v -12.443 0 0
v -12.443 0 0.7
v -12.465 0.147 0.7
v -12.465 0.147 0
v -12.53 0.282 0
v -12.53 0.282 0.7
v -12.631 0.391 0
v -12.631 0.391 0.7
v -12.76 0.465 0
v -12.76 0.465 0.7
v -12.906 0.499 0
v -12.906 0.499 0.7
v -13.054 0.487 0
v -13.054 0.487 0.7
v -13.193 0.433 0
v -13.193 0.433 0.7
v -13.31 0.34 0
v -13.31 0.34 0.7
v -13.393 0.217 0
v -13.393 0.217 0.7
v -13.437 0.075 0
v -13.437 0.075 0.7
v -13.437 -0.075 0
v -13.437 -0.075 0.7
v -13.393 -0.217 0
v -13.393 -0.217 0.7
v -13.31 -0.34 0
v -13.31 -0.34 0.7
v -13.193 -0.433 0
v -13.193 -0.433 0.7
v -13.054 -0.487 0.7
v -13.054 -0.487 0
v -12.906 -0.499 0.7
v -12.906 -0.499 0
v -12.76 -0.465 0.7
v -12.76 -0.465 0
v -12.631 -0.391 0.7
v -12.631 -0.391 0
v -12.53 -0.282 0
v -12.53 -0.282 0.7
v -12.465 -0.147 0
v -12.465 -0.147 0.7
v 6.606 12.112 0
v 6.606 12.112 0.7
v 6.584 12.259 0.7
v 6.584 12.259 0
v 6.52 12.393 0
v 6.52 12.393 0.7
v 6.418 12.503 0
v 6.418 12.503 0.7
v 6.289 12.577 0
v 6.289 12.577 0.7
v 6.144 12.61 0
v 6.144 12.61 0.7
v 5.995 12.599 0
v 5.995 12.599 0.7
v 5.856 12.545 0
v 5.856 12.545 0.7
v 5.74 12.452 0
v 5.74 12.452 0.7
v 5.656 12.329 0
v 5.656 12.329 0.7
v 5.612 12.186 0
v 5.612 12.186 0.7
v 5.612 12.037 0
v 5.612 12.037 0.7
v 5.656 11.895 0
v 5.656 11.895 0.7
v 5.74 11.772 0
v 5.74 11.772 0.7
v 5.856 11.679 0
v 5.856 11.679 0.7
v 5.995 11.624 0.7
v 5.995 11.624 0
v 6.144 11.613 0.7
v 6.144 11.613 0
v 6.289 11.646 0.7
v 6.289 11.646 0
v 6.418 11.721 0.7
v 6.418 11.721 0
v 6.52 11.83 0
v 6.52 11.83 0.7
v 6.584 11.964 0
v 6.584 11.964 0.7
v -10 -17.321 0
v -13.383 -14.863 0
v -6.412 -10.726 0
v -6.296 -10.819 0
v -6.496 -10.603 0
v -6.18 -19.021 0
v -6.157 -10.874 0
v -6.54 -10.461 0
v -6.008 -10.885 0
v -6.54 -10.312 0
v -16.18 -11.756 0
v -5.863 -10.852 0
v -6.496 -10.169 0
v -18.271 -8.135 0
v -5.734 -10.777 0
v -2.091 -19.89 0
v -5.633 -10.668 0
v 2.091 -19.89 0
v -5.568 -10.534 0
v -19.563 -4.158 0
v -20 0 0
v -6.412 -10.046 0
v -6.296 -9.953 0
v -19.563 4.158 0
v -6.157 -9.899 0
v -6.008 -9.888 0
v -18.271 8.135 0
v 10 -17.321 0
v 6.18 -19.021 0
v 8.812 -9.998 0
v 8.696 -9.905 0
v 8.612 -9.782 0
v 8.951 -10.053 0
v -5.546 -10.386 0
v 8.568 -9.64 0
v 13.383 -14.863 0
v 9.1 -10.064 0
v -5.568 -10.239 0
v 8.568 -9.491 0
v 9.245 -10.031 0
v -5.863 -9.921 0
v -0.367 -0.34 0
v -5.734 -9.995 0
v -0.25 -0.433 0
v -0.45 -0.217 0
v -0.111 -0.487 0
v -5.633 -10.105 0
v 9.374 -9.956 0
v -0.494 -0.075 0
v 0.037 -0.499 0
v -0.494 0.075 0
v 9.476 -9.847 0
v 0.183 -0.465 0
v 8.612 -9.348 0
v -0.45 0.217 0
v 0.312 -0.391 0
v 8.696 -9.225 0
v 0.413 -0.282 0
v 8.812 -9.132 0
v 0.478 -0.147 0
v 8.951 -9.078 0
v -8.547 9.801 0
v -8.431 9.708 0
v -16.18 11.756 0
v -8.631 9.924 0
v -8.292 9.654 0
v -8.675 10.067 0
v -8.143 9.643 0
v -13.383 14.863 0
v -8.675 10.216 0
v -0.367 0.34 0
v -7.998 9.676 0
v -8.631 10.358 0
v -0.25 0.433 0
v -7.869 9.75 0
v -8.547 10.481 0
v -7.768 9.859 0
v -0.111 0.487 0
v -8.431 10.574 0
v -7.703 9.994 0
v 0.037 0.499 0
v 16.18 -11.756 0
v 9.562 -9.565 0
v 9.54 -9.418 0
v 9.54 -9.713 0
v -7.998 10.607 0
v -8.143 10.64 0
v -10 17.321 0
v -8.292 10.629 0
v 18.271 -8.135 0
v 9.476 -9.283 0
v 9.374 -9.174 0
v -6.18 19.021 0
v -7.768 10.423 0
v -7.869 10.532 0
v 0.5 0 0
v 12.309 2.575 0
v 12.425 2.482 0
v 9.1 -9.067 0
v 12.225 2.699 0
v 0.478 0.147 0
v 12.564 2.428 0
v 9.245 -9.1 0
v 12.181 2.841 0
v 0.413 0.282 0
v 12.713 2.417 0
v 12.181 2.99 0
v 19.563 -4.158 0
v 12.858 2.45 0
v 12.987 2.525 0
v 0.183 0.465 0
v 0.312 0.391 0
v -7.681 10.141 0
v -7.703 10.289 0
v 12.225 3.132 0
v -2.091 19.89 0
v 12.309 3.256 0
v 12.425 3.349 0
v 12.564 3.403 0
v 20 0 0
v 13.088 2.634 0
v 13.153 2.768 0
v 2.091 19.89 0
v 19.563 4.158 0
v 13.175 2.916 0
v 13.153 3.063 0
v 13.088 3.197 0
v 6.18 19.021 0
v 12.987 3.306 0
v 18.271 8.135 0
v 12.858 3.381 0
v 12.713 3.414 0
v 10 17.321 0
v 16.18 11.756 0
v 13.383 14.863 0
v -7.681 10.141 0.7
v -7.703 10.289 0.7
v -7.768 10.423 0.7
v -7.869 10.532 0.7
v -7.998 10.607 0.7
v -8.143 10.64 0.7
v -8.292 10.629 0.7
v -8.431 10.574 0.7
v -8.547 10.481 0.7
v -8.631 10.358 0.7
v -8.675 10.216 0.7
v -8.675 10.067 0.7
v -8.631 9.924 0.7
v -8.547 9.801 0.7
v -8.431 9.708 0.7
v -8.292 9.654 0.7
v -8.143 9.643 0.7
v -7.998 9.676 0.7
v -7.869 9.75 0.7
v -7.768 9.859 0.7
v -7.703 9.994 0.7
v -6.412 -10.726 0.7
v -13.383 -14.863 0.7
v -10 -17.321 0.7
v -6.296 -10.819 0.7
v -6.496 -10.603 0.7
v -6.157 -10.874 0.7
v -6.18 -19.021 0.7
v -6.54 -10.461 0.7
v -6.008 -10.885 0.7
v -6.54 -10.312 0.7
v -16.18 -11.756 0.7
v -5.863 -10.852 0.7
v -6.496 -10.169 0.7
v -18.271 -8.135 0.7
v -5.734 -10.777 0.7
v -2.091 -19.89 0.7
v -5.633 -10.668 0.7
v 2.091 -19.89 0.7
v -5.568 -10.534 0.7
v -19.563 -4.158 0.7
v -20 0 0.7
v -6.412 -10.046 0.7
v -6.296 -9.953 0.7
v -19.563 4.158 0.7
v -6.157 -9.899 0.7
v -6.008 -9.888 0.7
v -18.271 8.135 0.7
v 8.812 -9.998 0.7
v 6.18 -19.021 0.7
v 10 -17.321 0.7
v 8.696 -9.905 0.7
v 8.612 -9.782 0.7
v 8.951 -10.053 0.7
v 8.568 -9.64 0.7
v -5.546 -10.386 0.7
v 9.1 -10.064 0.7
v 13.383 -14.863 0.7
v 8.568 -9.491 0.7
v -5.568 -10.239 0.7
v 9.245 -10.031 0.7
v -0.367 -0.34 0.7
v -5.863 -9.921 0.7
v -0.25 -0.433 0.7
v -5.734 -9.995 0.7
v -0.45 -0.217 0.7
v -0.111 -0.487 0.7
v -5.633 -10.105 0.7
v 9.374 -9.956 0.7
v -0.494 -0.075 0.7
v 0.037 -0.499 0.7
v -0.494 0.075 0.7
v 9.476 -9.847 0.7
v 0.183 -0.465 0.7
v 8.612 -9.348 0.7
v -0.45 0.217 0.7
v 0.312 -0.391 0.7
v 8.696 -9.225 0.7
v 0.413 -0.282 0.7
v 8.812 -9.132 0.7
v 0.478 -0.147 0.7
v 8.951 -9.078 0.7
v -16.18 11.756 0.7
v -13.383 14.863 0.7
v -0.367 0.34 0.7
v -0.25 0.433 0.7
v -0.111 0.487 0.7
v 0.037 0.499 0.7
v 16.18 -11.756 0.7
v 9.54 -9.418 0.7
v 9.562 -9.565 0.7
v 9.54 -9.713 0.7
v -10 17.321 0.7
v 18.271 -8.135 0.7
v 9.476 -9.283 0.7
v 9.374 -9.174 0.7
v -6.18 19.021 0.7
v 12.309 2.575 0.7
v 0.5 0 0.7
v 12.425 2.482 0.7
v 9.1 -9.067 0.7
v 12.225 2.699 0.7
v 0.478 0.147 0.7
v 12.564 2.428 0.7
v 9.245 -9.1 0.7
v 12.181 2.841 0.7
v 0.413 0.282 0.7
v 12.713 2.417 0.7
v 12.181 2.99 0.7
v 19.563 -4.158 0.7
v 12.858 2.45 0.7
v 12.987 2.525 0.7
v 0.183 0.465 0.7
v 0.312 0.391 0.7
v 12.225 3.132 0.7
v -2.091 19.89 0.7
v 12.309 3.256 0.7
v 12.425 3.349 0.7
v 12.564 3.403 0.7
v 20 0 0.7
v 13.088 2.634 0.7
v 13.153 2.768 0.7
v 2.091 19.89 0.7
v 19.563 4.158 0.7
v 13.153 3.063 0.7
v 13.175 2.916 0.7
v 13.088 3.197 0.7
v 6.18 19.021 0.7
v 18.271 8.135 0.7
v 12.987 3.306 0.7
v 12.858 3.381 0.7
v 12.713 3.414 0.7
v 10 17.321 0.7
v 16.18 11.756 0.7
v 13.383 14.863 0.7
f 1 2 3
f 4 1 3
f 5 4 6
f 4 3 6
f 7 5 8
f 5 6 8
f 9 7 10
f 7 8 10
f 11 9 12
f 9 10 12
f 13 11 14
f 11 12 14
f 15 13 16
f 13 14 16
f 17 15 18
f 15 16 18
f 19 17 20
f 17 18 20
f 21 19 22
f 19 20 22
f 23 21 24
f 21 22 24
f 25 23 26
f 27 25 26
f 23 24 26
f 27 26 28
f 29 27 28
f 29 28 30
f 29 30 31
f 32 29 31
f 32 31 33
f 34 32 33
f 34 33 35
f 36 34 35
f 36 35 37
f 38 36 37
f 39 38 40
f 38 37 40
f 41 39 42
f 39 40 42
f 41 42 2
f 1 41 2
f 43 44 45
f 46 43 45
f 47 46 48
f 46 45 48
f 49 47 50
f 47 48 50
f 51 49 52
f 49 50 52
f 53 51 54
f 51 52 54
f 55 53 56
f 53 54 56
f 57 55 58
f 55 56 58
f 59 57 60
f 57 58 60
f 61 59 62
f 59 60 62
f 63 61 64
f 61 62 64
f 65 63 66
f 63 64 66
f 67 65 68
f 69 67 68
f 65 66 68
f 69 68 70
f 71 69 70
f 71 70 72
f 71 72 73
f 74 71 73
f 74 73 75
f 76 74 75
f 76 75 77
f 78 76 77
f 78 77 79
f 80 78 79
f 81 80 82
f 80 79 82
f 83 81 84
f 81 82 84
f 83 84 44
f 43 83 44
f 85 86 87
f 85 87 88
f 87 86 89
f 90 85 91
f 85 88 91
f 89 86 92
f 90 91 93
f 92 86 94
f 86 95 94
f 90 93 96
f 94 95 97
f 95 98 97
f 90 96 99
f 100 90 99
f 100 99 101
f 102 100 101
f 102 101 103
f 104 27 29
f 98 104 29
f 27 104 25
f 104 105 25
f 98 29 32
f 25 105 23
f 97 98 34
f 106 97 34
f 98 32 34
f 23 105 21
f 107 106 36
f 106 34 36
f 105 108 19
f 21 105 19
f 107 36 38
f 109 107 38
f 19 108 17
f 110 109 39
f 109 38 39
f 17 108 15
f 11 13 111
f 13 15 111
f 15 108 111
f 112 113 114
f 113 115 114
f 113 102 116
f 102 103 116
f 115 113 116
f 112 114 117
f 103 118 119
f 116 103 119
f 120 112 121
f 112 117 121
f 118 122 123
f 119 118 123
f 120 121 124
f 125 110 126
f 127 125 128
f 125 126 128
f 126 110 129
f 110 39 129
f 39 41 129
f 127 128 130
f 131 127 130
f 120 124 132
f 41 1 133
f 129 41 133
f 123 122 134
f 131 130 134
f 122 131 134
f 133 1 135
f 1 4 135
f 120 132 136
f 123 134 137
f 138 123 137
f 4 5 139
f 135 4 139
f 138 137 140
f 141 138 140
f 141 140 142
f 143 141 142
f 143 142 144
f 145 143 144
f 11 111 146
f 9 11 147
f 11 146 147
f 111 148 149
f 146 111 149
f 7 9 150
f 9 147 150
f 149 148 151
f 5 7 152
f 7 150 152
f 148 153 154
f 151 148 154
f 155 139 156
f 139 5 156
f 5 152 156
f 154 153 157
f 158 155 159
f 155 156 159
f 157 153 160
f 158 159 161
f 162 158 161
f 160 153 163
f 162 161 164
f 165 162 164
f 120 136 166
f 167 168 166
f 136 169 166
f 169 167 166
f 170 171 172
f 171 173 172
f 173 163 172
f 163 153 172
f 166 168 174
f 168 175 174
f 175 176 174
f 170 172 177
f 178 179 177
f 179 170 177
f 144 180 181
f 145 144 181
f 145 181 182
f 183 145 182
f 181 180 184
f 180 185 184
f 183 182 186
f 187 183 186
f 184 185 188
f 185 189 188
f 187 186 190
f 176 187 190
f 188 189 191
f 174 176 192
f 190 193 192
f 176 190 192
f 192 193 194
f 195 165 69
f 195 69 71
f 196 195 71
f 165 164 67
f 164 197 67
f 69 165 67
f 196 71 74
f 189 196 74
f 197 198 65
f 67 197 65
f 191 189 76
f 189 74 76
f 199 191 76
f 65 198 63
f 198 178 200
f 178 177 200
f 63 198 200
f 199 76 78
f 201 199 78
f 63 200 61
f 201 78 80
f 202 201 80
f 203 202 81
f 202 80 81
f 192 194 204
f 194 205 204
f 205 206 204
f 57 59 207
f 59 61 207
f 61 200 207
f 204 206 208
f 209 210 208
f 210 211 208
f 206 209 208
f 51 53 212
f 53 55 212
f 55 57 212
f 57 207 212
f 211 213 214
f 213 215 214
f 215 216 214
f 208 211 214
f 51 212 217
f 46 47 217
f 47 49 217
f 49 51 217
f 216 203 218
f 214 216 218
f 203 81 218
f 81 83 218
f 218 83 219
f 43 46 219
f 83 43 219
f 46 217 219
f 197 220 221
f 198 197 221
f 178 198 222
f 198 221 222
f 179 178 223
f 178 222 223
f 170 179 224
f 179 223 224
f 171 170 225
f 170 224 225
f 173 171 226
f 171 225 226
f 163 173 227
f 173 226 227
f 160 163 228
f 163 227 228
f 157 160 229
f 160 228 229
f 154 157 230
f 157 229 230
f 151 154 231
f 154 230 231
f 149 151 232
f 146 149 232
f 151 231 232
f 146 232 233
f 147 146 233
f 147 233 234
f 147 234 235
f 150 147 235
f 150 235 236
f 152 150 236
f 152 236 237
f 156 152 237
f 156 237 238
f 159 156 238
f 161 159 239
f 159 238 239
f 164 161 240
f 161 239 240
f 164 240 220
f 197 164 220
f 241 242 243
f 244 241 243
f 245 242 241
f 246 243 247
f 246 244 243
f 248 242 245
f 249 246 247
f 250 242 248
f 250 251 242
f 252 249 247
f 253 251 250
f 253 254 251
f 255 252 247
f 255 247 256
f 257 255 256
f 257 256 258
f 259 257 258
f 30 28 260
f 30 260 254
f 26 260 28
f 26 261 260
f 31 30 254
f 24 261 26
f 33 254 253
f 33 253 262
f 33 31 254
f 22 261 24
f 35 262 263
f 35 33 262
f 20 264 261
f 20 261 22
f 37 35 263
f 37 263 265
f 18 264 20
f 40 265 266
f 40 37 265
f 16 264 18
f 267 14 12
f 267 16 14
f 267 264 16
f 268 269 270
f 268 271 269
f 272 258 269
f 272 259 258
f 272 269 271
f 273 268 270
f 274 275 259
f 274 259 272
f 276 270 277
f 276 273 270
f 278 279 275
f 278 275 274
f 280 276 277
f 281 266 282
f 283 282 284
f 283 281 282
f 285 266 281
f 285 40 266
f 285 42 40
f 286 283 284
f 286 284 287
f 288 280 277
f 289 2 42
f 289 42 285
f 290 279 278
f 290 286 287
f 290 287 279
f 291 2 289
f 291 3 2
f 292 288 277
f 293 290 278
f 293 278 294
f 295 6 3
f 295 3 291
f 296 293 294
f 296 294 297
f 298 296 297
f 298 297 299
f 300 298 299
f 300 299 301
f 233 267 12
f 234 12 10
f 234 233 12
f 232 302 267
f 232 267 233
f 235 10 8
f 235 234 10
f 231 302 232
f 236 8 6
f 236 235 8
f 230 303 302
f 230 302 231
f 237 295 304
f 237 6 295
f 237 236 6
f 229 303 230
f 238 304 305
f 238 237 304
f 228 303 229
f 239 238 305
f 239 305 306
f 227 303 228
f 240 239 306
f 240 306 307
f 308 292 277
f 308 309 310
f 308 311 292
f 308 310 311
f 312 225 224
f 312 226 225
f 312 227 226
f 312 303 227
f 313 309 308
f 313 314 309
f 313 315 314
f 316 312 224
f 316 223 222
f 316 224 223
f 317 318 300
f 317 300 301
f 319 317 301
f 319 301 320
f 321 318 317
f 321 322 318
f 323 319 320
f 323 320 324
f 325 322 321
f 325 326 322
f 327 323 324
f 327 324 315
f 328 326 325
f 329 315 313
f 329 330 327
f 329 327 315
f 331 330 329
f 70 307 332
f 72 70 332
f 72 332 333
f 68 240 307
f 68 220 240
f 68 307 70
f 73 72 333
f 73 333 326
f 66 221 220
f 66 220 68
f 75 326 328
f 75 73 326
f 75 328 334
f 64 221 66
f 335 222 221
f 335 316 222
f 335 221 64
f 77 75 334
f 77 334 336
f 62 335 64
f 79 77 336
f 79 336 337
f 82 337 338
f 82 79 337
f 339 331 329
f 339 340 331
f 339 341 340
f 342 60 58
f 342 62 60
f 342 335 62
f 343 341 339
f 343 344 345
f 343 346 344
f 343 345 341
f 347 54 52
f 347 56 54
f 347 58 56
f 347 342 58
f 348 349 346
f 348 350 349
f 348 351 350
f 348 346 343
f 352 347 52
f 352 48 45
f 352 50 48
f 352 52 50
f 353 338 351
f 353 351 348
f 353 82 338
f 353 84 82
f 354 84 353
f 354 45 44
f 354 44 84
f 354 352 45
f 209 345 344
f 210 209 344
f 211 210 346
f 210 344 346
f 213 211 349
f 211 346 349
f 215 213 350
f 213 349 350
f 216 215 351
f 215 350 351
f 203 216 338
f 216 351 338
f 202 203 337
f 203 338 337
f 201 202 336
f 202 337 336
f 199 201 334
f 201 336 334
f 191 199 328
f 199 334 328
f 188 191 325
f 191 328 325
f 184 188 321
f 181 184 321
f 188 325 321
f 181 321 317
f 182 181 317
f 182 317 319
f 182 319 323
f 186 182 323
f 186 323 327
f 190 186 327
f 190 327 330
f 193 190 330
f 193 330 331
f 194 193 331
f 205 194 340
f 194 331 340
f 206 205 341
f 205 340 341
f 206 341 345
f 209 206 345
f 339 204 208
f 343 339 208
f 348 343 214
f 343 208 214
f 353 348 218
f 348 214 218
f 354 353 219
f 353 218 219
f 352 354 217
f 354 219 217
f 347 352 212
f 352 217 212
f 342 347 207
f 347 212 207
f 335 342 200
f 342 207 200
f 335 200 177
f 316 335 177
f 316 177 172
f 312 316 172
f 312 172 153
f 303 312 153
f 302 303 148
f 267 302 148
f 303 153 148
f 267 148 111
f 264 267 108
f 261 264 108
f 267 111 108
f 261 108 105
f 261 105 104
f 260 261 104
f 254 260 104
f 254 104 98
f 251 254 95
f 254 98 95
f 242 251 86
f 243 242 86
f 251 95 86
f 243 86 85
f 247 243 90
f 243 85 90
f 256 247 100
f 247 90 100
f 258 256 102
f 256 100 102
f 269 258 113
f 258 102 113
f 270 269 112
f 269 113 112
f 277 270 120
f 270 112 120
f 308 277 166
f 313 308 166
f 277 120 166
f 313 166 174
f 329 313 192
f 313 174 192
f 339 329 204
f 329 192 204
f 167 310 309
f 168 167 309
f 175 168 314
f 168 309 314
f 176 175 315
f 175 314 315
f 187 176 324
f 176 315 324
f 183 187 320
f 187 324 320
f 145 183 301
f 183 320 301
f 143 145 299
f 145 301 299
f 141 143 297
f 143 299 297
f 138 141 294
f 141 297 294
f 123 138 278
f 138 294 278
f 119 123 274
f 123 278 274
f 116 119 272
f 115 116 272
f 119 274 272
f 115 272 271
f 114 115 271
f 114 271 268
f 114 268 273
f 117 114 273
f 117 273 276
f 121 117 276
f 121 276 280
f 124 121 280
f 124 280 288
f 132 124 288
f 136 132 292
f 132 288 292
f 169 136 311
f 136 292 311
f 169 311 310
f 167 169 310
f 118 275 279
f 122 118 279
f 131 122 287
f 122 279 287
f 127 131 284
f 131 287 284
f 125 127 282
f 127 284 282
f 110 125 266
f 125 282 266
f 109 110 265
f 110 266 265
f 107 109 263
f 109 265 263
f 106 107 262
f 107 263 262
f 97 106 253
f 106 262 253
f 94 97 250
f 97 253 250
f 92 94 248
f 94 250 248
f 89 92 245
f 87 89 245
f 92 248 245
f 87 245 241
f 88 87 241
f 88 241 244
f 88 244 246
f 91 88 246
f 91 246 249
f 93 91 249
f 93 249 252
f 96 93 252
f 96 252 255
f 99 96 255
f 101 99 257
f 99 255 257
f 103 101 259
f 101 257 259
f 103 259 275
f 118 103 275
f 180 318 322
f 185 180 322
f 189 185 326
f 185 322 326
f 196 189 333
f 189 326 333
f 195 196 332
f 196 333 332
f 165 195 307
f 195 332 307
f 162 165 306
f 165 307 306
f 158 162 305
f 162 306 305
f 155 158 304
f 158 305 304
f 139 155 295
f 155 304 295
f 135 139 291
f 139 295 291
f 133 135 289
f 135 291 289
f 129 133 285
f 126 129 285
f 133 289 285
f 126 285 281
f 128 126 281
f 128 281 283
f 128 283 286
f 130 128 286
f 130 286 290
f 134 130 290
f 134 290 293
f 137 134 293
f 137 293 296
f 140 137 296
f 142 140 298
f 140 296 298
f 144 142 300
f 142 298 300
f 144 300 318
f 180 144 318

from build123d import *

# Parameters (mm, degrees)
F0_R     = 20
F1_DEPTH = 0.7
F2_R     = 0.5
F3_DEPTH = 0.7


with BuildPart() as f1:
    # F0 (on Top) → F1 (new body)
    with BuildSketch(Plane.XY):
        Circle(F0_R)
    extrude(amount=F1_DEPTH)

    # F2 (on face) → F3 (cut)
    with BuildSketch(Plane.XY.offset(0.7)):
        with Locations((-12.942992, 0)):
            Circle(F2_R)
        with Locations((12.675214, 2.915508)):
            Circle(F2_R)
        with Locations((9.06239, -9.565156)):
            Circle(F2_R)
        Circle(F2_R)
        with Locations((-8.180633, 10.141156)):
            Circle(F2_R)
        with Locations((-6.045783, -10.386252)):
            Circle(F2_R)
        with Locations((6.106443, 12.111788)):
            Circle(F2_R)
    extrude(amount=-F3_DEPTH, mode=Mode.SUBTRACT)


solid = f1.part
